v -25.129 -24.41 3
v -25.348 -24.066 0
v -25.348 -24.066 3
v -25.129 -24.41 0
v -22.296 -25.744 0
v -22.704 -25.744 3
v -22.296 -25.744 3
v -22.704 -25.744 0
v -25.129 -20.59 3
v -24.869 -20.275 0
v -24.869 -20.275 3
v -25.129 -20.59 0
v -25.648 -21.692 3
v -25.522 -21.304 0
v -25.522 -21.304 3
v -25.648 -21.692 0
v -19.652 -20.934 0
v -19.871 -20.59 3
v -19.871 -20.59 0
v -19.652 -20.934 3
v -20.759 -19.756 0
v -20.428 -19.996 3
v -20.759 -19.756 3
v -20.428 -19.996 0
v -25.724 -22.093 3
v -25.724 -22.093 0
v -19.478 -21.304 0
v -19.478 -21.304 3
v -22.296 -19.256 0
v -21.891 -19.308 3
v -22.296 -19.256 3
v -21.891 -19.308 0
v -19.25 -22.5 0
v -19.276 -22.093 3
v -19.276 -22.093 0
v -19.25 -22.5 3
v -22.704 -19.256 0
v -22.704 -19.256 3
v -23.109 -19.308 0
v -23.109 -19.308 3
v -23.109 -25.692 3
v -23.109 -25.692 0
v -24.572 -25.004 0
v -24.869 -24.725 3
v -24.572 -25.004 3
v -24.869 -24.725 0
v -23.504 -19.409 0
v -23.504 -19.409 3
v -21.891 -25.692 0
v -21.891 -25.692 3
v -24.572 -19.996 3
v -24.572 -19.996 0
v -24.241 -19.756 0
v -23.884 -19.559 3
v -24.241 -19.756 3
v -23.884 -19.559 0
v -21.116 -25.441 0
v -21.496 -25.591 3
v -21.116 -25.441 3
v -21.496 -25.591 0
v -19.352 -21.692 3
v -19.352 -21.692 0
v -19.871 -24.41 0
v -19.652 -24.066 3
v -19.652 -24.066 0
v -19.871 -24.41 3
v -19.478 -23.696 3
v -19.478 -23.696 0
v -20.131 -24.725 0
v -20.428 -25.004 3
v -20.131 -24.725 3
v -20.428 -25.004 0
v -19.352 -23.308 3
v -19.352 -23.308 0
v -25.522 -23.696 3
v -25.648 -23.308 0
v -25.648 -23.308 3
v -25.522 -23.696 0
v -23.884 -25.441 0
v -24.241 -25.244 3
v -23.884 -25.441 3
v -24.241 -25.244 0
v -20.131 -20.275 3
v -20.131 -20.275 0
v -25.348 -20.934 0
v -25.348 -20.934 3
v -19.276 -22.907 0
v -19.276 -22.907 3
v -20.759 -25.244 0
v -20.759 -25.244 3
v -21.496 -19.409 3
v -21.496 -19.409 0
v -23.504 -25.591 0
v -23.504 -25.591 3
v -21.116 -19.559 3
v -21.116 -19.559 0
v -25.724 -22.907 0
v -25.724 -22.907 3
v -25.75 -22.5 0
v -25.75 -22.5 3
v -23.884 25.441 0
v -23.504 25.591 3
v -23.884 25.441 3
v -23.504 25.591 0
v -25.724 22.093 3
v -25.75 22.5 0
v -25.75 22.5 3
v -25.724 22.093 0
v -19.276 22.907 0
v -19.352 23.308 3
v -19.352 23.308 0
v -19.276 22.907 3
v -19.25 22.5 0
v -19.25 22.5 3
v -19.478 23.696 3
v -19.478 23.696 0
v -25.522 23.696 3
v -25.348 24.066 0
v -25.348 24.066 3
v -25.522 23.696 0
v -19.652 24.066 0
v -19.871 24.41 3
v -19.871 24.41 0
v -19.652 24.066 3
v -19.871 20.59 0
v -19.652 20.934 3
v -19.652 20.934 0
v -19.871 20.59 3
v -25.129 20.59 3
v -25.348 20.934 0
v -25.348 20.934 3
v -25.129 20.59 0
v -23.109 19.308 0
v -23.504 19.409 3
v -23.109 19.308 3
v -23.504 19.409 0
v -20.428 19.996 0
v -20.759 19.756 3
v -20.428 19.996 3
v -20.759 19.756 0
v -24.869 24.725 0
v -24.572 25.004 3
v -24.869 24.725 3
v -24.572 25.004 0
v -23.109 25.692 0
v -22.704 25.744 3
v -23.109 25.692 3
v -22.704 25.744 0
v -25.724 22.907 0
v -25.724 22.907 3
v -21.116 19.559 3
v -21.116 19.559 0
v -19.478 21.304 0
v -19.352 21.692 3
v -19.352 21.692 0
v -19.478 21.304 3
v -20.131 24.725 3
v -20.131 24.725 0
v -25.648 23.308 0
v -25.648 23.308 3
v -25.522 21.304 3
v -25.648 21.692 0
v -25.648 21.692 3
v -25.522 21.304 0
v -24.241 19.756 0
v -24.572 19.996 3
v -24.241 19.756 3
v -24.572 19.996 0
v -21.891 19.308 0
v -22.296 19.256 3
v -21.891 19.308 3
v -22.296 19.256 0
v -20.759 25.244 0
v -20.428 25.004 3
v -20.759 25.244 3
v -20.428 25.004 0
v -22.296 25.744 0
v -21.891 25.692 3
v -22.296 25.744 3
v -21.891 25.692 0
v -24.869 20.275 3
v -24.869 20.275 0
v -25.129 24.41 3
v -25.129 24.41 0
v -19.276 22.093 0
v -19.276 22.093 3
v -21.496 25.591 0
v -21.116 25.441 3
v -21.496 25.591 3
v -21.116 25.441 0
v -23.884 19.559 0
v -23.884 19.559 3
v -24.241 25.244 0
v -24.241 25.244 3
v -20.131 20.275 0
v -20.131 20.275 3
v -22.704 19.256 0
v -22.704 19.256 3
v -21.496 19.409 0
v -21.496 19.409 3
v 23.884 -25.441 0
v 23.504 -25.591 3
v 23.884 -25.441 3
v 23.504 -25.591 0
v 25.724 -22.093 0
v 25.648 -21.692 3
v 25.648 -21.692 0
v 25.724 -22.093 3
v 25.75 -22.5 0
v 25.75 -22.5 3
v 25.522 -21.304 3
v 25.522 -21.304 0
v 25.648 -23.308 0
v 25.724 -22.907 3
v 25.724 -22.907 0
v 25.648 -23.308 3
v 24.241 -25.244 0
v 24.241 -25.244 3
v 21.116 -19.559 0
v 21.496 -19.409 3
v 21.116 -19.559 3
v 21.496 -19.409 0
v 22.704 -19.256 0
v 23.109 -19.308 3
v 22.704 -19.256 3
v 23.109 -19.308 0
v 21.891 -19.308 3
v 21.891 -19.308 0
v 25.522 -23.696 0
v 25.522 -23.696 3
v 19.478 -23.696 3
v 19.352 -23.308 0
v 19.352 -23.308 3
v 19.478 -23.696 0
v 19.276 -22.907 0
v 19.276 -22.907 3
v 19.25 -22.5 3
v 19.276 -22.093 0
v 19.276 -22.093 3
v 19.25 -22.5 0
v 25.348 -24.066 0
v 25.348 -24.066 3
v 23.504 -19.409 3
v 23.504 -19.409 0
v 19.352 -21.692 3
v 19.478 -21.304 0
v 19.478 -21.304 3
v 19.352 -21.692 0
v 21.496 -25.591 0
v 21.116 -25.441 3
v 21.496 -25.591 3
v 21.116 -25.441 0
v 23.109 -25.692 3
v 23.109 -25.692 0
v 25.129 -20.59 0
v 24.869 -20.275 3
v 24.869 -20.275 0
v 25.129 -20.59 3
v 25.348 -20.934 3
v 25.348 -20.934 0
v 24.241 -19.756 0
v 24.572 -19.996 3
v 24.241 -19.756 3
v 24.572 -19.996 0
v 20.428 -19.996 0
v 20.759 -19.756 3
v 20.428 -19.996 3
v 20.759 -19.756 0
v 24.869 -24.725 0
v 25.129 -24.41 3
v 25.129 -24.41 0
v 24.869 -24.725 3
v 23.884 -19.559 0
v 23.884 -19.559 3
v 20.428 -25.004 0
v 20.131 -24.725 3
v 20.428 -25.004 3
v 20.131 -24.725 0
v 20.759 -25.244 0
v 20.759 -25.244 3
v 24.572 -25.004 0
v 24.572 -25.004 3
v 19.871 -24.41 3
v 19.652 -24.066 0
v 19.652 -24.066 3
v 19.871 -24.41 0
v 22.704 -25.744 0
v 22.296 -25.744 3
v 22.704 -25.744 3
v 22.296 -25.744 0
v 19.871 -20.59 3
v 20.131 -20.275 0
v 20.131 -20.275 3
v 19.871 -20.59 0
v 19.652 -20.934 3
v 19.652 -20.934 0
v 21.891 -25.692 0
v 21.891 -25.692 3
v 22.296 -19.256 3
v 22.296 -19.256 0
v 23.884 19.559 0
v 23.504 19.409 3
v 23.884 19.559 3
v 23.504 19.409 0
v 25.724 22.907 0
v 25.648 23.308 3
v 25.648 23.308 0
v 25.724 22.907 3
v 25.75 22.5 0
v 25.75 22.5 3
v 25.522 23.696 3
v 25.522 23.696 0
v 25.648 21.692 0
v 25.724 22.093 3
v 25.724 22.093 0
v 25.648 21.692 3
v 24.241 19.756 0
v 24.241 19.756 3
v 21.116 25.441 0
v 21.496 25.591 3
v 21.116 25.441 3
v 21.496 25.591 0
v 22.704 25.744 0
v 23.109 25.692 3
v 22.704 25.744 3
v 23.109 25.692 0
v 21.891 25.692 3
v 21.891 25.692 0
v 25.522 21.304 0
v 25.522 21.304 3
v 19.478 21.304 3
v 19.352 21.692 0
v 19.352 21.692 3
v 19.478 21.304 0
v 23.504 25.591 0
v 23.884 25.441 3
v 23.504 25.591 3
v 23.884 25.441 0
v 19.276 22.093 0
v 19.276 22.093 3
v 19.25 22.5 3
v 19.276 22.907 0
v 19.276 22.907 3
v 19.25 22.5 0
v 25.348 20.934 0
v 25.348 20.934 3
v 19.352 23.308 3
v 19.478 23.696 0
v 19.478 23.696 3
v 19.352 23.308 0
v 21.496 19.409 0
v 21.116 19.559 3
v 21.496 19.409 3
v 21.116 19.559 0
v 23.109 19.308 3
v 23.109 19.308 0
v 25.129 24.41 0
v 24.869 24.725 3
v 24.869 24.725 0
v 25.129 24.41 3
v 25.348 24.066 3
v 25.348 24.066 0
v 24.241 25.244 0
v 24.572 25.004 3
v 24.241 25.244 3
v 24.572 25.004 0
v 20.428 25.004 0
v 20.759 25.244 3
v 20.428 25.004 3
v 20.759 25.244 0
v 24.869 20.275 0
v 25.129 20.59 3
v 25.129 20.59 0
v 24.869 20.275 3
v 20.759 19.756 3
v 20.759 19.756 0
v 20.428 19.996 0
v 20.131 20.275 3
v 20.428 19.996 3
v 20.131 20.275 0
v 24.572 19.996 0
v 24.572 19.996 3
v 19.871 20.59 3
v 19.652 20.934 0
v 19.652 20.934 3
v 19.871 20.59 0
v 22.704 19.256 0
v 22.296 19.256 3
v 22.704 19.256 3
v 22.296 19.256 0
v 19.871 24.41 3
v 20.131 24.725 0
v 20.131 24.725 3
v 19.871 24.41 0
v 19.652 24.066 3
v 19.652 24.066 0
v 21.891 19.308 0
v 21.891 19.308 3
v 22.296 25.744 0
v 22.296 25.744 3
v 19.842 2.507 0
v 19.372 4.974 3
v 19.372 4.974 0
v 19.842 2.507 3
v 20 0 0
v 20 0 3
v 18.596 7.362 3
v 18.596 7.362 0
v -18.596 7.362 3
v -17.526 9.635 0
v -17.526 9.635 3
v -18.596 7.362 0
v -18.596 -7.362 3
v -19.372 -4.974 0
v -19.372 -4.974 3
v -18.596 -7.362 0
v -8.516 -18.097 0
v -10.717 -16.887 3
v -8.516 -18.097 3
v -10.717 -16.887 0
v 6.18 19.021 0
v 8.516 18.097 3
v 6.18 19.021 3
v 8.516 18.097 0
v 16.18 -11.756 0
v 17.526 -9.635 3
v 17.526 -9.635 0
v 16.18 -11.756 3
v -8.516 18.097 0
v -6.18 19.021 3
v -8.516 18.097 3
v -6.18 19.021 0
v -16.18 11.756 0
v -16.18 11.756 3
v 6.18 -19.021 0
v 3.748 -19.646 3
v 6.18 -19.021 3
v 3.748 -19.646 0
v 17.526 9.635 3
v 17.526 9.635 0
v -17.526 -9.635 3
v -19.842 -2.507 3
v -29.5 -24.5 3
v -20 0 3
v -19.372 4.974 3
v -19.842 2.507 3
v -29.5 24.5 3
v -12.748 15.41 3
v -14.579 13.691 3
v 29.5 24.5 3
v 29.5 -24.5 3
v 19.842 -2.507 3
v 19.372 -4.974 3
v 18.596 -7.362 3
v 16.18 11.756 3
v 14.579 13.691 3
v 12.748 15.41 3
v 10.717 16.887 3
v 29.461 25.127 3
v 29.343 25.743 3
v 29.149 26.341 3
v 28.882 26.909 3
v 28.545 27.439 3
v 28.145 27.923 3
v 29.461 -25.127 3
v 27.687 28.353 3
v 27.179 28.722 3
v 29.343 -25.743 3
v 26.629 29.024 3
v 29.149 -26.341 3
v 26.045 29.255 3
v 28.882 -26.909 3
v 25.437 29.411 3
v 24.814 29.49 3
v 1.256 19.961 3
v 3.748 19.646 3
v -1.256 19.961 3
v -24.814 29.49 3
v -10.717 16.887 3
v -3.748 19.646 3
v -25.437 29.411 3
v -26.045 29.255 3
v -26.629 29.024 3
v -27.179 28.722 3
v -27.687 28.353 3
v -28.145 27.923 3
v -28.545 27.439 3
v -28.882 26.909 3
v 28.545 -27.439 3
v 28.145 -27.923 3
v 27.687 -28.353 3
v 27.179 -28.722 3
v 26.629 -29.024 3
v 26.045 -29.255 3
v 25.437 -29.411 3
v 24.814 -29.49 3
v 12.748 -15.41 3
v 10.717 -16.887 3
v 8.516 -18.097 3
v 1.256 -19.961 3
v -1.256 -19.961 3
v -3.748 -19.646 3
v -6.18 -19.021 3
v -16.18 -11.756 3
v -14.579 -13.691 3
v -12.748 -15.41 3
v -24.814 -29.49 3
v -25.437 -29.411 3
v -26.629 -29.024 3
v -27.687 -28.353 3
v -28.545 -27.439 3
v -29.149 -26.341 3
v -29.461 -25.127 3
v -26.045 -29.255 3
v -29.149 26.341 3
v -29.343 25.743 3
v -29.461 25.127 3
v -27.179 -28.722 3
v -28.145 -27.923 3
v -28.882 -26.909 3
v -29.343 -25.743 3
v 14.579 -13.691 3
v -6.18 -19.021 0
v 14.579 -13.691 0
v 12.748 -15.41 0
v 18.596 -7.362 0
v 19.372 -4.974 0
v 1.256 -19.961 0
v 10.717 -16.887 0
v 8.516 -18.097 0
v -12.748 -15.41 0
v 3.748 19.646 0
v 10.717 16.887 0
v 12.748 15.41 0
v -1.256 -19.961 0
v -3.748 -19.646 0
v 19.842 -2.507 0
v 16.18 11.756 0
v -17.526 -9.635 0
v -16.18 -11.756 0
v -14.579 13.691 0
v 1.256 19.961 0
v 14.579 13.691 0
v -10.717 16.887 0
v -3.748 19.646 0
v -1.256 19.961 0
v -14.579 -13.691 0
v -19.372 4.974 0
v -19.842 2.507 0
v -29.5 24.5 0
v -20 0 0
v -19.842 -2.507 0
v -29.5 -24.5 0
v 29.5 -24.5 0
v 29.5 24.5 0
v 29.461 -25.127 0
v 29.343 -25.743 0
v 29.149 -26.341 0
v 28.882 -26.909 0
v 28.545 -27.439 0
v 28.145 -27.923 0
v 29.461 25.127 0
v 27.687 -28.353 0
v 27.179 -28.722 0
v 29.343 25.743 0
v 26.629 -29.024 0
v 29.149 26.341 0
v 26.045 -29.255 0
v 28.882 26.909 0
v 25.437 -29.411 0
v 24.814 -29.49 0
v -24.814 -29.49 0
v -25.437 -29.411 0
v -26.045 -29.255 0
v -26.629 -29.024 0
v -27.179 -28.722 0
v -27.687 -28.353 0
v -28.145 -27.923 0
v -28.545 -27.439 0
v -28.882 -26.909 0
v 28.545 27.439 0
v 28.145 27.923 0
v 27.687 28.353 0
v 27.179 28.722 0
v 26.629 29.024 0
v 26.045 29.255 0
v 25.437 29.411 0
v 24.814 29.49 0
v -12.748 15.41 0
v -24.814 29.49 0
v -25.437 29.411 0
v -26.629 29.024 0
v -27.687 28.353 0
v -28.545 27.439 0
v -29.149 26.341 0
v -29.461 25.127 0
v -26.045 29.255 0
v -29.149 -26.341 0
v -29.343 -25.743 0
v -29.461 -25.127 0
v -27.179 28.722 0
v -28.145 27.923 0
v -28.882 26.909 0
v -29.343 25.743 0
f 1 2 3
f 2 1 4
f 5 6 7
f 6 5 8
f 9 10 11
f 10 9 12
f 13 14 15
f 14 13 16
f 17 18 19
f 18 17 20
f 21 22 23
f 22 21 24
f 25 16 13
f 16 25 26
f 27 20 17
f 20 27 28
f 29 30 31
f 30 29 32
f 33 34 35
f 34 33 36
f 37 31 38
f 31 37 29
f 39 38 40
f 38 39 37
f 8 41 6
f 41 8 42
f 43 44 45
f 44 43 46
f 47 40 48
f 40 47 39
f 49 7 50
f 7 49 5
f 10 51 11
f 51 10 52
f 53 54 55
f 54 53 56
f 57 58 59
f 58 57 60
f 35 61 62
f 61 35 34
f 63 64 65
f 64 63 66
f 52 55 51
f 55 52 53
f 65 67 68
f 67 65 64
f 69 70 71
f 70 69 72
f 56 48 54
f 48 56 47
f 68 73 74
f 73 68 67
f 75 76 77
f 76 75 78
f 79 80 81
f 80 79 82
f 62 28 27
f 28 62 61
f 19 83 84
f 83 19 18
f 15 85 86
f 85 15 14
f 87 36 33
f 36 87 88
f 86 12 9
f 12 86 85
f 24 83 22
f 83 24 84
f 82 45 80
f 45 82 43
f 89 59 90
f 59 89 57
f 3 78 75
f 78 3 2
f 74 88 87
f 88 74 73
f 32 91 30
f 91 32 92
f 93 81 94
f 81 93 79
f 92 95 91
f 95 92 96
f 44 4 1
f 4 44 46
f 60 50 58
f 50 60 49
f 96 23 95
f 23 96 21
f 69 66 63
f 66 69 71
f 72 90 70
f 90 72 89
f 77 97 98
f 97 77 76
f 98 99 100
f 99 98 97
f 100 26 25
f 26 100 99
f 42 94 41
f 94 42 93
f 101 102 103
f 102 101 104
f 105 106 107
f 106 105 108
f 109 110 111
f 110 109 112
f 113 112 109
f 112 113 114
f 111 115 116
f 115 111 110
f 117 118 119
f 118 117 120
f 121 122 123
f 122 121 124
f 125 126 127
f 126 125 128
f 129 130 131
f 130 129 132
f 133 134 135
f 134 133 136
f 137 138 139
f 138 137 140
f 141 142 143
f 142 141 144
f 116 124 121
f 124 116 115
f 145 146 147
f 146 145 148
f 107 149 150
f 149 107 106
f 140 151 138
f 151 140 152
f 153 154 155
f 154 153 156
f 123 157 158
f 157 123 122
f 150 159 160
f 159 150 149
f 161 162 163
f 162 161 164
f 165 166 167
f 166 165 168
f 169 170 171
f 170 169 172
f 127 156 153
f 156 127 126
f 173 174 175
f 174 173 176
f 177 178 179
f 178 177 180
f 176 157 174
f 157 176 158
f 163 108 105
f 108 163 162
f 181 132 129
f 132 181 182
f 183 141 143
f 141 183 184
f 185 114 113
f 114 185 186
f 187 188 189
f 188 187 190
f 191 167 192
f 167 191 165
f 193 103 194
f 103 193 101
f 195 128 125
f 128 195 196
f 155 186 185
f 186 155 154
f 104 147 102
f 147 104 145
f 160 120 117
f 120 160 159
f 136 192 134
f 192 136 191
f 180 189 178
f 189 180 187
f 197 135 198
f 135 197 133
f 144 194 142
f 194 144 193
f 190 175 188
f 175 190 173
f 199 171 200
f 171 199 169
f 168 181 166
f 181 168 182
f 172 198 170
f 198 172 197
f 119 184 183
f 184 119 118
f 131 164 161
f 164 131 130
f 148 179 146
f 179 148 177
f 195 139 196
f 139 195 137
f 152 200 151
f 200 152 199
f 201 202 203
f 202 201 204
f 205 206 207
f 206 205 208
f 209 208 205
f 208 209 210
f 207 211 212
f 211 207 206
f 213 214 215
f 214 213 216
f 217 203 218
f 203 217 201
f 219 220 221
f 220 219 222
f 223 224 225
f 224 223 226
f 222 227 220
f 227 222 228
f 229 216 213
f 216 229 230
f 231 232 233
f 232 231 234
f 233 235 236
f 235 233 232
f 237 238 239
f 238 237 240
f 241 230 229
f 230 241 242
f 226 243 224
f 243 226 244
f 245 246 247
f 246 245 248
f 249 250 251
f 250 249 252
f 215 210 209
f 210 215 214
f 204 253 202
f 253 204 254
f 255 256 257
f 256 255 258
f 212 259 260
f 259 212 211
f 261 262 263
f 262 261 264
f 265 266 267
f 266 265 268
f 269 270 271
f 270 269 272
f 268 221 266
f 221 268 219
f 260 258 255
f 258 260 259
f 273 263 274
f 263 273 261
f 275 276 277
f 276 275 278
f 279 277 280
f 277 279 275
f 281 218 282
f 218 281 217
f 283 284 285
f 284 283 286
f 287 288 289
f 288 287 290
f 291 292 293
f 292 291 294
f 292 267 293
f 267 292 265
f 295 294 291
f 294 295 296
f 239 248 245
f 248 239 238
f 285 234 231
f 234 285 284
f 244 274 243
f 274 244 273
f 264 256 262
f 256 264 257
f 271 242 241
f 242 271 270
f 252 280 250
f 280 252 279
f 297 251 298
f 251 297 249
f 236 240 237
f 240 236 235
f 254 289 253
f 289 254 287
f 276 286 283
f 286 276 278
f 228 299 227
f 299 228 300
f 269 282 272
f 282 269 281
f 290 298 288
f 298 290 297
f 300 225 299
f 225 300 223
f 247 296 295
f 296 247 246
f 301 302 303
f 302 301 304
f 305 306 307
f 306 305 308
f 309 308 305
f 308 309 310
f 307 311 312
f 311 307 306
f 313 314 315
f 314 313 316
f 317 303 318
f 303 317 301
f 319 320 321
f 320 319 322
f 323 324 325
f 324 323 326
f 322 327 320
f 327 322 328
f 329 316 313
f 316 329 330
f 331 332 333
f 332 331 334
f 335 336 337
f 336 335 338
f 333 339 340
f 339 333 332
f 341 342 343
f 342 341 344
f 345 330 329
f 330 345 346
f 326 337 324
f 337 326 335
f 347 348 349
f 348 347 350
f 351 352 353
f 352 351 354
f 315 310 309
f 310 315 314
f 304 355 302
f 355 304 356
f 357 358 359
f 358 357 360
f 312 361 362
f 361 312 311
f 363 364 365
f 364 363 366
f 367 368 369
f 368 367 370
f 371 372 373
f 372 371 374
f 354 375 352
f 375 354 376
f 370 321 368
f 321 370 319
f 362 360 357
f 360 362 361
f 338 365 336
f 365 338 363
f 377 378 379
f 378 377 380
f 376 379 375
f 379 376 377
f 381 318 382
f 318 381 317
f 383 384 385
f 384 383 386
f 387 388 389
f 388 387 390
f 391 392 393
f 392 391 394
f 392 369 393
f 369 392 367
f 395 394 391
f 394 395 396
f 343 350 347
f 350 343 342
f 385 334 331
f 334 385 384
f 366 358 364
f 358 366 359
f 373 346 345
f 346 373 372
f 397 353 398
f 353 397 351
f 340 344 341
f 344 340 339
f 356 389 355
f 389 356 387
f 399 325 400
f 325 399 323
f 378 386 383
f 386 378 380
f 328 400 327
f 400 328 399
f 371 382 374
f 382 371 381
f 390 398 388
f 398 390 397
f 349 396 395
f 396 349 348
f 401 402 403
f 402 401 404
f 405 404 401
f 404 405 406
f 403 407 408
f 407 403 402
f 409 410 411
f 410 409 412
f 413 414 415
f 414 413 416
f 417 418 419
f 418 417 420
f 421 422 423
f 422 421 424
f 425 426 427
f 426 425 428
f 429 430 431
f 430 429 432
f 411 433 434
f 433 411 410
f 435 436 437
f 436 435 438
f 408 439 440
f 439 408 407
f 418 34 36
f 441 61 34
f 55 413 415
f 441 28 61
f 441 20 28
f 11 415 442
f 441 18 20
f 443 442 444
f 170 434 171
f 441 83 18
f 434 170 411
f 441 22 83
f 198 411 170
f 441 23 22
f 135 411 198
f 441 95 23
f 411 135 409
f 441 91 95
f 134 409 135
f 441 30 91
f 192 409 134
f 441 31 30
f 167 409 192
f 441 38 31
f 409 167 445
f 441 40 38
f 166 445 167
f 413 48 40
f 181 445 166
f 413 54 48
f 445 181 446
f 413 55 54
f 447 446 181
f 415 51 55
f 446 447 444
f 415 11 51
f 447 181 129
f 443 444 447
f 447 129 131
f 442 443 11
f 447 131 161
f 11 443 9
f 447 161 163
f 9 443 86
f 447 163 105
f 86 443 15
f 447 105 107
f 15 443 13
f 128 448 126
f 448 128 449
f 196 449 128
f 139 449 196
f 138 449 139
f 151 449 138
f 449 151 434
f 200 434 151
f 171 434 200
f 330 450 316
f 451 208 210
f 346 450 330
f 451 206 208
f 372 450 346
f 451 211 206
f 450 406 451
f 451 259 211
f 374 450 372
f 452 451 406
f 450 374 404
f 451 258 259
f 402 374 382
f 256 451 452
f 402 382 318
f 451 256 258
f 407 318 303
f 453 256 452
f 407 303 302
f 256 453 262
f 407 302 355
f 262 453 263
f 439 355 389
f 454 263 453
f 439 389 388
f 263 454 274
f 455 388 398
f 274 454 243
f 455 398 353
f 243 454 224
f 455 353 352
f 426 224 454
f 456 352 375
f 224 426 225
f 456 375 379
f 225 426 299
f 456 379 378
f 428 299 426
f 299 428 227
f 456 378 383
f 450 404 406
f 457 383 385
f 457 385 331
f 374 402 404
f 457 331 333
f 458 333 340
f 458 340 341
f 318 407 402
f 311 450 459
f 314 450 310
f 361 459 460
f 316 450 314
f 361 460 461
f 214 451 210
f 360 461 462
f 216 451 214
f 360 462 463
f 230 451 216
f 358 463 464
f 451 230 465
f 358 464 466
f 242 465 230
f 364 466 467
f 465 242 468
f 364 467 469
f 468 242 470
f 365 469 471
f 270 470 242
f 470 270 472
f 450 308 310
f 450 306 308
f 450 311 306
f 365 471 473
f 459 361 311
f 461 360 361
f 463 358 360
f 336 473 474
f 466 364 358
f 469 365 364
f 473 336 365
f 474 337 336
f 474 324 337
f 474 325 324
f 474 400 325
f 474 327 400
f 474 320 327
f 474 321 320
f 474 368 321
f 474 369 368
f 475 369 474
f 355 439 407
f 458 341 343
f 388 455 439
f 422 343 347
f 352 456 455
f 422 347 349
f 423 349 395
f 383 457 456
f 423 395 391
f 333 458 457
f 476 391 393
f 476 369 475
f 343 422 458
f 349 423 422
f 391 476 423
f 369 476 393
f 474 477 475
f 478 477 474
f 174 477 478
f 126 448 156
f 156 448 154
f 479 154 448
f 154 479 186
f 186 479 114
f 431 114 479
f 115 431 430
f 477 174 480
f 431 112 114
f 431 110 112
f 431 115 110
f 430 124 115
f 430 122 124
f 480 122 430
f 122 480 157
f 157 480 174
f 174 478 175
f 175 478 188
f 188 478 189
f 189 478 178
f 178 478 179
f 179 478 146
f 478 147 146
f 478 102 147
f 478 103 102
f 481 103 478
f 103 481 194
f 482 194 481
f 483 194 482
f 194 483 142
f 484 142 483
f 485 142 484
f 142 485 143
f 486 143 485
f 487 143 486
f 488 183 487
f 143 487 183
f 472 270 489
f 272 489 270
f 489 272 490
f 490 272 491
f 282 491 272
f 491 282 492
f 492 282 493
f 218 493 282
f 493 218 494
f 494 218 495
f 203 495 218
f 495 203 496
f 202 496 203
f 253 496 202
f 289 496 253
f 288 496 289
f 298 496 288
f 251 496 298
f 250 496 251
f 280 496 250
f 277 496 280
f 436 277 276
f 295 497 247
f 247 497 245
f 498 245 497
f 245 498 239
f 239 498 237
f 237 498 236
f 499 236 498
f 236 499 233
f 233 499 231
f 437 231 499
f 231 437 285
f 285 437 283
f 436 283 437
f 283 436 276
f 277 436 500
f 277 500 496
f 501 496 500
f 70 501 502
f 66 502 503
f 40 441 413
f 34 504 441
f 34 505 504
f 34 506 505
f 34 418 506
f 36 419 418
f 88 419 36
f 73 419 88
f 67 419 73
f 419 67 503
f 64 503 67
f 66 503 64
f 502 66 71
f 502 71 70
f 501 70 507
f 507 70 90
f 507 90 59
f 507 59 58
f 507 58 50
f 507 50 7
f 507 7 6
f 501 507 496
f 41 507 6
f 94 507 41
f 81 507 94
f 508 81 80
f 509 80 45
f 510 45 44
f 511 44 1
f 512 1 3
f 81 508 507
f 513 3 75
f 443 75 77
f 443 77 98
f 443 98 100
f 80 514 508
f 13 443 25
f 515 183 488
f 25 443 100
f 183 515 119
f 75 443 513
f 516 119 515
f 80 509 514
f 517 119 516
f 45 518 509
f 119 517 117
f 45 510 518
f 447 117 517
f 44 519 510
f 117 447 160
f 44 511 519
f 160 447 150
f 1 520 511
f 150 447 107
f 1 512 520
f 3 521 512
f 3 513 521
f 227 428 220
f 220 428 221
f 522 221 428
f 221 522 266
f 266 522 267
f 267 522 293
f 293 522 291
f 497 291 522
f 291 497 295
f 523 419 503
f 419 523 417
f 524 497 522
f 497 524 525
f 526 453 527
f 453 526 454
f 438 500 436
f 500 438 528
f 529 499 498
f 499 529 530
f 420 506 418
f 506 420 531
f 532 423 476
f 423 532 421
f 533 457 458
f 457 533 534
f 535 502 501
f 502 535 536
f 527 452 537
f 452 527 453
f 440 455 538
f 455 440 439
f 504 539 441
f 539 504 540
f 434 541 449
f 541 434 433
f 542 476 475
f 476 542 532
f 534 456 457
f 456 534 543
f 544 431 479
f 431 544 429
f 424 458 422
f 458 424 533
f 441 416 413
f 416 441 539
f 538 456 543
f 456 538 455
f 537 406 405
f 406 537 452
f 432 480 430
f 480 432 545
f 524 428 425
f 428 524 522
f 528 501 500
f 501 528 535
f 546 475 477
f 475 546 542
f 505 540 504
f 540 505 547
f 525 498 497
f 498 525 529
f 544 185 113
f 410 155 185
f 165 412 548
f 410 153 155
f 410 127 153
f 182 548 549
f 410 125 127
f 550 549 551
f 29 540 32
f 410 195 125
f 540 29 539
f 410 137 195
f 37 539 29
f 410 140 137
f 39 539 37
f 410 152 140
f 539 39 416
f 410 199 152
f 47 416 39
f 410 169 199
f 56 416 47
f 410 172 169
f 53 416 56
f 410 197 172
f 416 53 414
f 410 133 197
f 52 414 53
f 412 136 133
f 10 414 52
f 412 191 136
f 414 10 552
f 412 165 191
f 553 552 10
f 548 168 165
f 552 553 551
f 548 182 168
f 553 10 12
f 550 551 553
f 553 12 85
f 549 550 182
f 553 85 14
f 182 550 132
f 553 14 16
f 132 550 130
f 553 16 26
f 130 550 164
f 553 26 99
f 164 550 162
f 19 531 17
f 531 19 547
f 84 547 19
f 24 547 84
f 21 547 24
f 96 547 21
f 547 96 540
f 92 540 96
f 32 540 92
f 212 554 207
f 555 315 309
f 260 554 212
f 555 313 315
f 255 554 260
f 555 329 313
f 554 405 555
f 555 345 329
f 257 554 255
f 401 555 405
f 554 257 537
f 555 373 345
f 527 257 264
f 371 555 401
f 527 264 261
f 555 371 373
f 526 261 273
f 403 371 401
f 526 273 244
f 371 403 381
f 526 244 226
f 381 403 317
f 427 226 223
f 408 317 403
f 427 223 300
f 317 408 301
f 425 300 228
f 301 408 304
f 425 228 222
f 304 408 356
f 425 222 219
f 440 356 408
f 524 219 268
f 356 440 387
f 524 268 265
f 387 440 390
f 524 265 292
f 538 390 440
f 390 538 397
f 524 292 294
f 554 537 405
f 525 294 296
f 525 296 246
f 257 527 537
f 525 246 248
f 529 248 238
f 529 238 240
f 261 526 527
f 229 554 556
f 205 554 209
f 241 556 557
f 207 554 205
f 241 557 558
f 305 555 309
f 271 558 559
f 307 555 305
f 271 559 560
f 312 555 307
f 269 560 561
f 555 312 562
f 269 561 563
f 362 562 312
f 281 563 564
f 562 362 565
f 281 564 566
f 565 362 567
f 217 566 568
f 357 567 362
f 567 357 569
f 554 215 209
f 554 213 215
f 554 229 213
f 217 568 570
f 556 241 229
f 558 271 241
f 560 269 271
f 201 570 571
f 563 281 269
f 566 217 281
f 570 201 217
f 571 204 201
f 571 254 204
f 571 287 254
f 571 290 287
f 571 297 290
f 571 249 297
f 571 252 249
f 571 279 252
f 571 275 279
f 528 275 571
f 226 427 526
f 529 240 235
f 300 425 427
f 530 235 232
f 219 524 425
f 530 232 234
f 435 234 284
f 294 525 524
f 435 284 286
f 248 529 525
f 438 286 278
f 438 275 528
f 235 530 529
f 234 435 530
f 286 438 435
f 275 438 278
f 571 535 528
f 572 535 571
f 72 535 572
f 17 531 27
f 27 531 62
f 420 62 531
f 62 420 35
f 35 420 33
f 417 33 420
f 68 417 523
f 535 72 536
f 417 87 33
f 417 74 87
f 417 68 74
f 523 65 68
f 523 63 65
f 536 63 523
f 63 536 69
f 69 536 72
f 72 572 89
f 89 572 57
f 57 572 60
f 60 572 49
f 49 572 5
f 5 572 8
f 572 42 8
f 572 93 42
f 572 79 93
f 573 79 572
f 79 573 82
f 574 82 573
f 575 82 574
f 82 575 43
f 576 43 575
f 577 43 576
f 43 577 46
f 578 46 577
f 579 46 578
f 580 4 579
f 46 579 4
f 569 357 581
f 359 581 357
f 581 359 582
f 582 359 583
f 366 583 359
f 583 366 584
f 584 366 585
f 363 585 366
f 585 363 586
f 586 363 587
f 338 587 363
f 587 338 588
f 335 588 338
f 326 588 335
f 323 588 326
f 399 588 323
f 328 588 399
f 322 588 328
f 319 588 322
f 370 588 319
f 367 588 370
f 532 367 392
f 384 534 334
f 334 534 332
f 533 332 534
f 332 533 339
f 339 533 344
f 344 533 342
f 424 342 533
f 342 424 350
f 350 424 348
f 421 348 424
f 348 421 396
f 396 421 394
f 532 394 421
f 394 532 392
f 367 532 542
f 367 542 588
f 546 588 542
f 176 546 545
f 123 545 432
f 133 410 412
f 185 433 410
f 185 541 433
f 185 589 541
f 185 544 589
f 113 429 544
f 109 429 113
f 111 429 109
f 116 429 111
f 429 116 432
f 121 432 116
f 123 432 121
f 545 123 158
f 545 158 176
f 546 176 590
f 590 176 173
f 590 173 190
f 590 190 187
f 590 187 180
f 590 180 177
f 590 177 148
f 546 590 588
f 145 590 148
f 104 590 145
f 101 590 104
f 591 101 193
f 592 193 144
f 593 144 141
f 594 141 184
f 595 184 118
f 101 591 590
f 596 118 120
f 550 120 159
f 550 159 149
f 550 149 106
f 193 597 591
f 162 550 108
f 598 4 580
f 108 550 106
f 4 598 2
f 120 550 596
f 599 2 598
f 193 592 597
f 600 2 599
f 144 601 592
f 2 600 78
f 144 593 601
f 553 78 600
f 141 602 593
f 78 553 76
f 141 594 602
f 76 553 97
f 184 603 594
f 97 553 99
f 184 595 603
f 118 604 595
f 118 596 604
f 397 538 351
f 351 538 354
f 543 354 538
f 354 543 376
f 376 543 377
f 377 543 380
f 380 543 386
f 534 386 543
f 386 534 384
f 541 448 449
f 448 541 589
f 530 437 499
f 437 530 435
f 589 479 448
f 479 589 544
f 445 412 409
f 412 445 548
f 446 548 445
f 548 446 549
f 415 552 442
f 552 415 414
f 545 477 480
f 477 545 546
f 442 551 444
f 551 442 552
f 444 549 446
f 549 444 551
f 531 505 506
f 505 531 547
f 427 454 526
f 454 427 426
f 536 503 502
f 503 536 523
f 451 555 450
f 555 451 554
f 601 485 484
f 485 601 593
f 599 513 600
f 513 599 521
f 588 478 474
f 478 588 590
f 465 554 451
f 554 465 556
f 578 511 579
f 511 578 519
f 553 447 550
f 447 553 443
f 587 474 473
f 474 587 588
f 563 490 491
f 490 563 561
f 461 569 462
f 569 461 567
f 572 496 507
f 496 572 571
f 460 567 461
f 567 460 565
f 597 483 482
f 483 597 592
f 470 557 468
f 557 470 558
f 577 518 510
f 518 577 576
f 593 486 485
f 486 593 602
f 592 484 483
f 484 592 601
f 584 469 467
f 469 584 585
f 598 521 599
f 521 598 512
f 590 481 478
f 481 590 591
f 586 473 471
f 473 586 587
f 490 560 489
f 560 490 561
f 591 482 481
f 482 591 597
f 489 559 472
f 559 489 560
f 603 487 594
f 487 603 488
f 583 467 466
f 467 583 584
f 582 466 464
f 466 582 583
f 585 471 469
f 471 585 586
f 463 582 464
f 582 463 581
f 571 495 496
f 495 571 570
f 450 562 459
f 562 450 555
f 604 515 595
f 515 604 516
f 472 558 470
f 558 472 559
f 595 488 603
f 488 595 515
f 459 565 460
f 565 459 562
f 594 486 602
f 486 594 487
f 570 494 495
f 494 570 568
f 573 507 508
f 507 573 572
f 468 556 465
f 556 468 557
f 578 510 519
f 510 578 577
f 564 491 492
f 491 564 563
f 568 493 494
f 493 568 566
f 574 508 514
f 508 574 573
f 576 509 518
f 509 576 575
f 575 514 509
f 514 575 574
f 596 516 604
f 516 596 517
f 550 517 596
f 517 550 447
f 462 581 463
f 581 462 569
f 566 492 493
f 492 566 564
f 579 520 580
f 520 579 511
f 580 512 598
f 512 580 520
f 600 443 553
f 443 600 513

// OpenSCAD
$fn = 50;


difference() {
	union() {
		hull() {
			translate(v = [-24.5000000000, 24.5000000000, 0]) {
				cylinder(h = 3, r = 5);
			}
			translate(v = [24.5000000000, 24.5000000000, 0]) {
				cylinder(h = 3, r = 5);
			}
			translate(v = [-24.5000000000, -24.5000000000, 0]) {
				cylinder(h = 3, r = 5);
			}
			translate(v = [24.5000000000, -24.5000000000, 0]) {
				cylinder(h = 3, r = 5);
			}
		}
	}
	union() {
		#translate(v = [-22.5000000000, -22.5000000000, -100.0000000000]) {
			cylinder(h = 200, r = 3.2500000000);
		}
		#translate(v = [-22.5000000000, 22.5000000000, -100.0000000000]) {
			cylinder(h = 200, r = 3.2500000000);
		}
		#translate(v = [22.5000000000, -22.5000000000, -100.0000000000]) {
			cylinder(h = 200, r = 3.2500000000);
		}
		#translate(v = [22.5000000000, 22.5000000000, -100.0000000000]) {
			cylinder(h = 200, r = 3.2500000000);
		}
		#cylinder(h = 3, r = 20.0000000000);
	}
}
